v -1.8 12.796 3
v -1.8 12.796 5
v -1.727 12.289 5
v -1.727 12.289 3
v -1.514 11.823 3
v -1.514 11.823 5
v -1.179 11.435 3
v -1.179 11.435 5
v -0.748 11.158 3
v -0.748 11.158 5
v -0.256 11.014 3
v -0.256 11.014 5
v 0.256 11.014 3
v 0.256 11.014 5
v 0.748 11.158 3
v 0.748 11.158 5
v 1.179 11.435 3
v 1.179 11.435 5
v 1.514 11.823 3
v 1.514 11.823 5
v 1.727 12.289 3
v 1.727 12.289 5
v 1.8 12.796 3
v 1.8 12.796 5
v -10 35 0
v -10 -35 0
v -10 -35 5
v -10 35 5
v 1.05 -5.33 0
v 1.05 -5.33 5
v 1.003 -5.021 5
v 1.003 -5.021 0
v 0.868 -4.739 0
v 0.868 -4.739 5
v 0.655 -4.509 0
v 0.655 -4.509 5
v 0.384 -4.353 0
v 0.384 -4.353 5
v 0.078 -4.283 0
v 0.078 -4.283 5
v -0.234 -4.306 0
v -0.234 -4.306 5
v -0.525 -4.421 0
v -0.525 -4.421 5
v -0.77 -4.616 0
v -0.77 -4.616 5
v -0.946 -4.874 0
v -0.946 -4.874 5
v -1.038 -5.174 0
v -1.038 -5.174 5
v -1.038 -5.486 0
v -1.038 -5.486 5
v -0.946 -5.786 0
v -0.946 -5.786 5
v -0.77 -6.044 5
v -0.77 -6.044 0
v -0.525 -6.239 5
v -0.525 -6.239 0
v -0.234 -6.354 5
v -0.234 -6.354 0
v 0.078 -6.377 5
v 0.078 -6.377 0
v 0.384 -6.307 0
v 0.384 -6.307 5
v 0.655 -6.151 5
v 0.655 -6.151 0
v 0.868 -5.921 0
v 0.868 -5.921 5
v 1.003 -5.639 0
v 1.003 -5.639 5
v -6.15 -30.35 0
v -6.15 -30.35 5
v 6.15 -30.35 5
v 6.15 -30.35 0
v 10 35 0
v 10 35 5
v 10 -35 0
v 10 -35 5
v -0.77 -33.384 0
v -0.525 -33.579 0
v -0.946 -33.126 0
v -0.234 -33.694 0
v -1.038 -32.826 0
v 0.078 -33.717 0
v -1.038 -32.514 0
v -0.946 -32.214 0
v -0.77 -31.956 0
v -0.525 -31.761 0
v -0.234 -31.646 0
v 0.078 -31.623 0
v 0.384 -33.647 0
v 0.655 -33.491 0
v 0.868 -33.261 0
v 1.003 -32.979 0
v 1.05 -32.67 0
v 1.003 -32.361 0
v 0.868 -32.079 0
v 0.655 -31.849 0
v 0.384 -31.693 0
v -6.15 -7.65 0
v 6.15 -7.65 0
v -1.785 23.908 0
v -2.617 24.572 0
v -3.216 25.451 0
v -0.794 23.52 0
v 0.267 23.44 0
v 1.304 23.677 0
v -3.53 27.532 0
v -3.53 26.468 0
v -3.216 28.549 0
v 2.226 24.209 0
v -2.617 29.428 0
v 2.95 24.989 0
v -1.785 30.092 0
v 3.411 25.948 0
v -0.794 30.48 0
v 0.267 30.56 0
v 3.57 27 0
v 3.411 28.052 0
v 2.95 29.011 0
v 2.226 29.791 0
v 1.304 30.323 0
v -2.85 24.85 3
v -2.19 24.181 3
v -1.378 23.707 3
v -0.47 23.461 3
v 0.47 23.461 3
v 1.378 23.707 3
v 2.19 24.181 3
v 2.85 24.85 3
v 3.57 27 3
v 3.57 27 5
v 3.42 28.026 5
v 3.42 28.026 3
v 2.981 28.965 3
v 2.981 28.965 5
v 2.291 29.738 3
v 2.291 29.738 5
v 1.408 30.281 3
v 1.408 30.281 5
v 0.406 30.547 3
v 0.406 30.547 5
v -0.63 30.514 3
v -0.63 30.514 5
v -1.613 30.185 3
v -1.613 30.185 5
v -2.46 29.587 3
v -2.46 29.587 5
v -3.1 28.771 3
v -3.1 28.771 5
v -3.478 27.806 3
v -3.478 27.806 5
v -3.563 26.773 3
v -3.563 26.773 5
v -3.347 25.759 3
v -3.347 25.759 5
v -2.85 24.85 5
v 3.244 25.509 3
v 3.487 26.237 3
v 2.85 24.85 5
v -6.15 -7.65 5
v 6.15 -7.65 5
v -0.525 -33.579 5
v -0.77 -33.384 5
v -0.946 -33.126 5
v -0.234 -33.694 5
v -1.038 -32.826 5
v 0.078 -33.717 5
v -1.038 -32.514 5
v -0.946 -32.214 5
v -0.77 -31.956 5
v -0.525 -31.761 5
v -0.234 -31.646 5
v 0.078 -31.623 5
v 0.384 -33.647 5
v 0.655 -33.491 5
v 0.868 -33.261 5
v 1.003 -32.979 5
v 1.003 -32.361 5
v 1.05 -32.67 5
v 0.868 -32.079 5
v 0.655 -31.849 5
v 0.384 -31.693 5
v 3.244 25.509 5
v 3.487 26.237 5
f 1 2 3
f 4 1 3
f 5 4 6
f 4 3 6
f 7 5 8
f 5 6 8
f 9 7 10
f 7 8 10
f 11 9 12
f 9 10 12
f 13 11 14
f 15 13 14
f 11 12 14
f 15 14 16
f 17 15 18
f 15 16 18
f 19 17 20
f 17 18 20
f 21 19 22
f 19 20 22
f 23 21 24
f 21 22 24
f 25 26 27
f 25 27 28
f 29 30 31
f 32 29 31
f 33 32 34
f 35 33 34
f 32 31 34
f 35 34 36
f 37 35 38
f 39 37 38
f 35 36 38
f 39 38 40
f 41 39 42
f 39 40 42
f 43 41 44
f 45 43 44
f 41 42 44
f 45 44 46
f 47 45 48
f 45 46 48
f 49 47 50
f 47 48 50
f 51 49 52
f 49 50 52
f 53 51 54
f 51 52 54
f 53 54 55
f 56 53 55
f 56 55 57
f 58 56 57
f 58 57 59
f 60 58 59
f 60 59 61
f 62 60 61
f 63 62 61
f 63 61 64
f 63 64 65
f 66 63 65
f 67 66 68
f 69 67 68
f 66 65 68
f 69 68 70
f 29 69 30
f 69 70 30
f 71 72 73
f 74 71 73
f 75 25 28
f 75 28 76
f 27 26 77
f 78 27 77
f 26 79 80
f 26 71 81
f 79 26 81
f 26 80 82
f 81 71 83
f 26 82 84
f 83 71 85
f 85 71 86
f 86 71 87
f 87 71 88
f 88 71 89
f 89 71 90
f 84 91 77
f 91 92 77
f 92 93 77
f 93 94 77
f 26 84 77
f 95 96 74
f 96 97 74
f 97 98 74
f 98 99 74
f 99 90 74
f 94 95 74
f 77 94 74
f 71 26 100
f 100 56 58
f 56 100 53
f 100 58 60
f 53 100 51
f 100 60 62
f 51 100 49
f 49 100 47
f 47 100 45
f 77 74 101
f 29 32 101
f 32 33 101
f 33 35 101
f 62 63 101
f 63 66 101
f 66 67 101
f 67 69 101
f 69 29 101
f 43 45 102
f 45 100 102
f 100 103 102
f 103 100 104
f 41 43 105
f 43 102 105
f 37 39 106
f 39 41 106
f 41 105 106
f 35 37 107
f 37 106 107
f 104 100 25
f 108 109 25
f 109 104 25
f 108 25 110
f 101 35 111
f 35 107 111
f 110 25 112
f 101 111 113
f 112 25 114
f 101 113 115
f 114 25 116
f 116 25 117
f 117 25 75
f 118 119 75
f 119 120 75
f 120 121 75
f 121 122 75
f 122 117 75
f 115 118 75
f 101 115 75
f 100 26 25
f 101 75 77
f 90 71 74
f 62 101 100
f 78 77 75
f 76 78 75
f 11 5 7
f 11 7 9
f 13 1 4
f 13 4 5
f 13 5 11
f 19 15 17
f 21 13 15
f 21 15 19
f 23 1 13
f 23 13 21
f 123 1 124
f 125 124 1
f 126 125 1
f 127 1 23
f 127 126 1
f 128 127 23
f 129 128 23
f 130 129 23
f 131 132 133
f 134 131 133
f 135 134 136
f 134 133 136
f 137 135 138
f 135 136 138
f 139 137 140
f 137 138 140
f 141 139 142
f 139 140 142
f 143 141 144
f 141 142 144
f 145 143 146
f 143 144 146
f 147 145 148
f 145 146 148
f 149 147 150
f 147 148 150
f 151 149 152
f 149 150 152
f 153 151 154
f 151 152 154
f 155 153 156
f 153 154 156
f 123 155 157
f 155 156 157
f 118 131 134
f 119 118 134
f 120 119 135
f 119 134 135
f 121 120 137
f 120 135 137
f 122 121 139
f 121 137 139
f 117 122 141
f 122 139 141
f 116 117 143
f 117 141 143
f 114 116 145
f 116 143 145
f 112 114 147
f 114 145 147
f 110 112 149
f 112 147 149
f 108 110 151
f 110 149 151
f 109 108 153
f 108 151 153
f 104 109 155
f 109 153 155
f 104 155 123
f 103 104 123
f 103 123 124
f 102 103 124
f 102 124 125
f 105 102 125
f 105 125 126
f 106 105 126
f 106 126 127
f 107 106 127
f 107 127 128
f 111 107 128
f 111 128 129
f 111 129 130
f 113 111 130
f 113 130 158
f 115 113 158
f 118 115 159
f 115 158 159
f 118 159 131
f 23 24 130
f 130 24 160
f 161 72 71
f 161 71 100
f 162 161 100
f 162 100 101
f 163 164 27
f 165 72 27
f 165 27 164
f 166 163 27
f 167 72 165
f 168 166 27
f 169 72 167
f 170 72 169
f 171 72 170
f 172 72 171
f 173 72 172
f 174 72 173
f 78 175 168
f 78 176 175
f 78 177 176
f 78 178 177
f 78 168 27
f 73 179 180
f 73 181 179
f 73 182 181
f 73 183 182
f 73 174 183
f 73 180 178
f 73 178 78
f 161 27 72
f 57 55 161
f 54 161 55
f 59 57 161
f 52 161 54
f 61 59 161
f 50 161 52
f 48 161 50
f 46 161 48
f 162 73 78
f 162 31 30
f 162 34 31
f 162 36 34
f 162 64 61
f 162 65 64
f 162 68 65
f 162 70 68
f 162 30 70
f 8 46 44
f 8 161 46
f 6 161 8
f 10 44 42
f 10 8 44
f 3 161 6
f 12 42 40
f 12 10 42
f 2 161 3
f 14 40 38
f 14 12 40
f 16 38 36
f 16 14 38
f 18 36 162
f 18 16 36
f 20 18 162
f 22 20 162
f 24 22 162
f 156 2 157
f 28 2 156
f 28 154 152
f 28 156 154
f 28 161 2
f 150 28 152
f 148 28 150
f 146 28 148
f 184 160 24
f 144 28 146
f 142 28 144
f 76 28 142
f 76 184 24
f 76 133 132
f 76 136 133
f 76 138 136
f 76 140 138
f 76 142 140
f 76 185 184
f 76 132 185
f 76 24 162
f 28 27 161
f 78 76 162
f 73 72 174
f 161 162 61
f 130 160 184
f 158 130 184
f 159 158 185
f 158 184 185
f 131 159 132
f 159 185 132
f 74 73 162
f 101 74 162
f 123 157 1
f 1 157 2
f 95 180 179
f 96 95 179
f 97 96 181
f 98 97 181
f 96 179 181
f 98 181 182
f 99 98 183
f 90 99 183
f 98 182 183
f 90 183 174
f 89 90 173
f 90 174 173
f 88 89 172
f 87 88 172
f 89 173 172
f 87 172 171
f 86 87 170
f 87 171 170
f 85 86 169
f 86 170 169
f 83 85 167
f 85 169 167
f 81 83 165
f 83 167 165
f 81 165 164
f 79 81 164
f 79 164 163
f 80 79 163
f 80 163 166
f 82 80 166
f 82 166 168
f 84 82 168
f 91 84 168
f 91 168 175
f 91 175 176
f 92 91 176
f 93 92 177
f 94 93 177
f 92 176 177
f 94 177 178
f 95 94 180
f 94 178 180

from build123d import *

# Parameters (mm, degrees)
SKETCH3_W           = 20
SKETCH3_H           = 70
BOSS_EXTRUDE3_DEPTH = 5
CUT_EXTRUDE2_DEPTH  = 2
SKETCH6_R           = 3.57
CUT_EXTRUDE3_DEPTH  = 3
SKETCH7_R           = 1.05
SKETCH7_W           = 12.3
SKETCH7_H           = 22.7
CUT_EXTRUDE4_DEPTH  = 5


with BuildPart() as part:
    # Sketch3 → Boss-Extrude3 (new body)
    with BuildSketch(Plane.XY):
        Rectangle(SKETCH3_W, SKETCH3_H)
    extrude(amount=BOSS_EXTRUDE3_DEPTH)

    # Sketch4 → Cut-Extrude2 (cut)
    with BuildSketch(Plane.XY.offset(5)):
        with BuildLine():
            Line((-2.85, 24.850023256), (-1.8, 12.795667197))
            Line((-1.8, 12.795667197), (1.8, 12.795667197))
            Line((1.8, 12.795667197), (2.85, 24.850023256))
            ThreePointArc((2.85, 24.850023256), (0, 23.43), (-2.85, 24.850023256))
        make_face()
        with BuildLine():
            Line((1.8, 12.795667197), (-1.8, 12.795667197))
            ThreePointArc((-1.8, 12.795667197), (0, 10.995667197), (1.8, 12.795667197))
        make_face()
        with BuildLine():
            ThreePointArc((3.57, 27), (-1.133666618, 30.385217866), (-2.85, 24.850023256))
            Line((-2.85, 24.850023256), (2.85, 24.850023256))
            ThreePointArc((2.85, 24.850023256), (3.385217866, 25.866333382), (3.57, 27))
        make_face()
        with BuildLine():
            Line((2.85, 24.850023256), (-2.85, 24.850023256))
            ThreePointArc((-2.85, 24.850023256), (0, 23.43), (2.85, 24.850023256))
        make_face()
    extrude(amount=-CUT_EXTRUDE2_DEPTH, mode=Mode.SUBTRACT)

    # Sketch6 → Cut-Extrude3 (cut)
    with BuildSketch(Plane.XY.offset(3)):
        with Locations((0, 27)):
            Circle(SKETCH6_R)
    extrude(amount=-CUT_EXTRUDE3_DEPTH, mode=Mode.SUBTRACT)

    # Sketch7 → Cut-Extrude4 (cut)
    with BuildSketch(Plane.XY.offset(5)):
        with Locations((0, -5.33)):
            Circle(SKETCH7_R)
        with Locations((0, -32.67)):
            Circle(SKETCH7_R)
        with Locations((0, -19)):
            Rectangle(SKETCH7_W, SKETCH7_H)
    extrude(amount=-CUT_EXTRUDE4_DEPTH, mode=Mode.SUBTRACT)


solid = part.part
